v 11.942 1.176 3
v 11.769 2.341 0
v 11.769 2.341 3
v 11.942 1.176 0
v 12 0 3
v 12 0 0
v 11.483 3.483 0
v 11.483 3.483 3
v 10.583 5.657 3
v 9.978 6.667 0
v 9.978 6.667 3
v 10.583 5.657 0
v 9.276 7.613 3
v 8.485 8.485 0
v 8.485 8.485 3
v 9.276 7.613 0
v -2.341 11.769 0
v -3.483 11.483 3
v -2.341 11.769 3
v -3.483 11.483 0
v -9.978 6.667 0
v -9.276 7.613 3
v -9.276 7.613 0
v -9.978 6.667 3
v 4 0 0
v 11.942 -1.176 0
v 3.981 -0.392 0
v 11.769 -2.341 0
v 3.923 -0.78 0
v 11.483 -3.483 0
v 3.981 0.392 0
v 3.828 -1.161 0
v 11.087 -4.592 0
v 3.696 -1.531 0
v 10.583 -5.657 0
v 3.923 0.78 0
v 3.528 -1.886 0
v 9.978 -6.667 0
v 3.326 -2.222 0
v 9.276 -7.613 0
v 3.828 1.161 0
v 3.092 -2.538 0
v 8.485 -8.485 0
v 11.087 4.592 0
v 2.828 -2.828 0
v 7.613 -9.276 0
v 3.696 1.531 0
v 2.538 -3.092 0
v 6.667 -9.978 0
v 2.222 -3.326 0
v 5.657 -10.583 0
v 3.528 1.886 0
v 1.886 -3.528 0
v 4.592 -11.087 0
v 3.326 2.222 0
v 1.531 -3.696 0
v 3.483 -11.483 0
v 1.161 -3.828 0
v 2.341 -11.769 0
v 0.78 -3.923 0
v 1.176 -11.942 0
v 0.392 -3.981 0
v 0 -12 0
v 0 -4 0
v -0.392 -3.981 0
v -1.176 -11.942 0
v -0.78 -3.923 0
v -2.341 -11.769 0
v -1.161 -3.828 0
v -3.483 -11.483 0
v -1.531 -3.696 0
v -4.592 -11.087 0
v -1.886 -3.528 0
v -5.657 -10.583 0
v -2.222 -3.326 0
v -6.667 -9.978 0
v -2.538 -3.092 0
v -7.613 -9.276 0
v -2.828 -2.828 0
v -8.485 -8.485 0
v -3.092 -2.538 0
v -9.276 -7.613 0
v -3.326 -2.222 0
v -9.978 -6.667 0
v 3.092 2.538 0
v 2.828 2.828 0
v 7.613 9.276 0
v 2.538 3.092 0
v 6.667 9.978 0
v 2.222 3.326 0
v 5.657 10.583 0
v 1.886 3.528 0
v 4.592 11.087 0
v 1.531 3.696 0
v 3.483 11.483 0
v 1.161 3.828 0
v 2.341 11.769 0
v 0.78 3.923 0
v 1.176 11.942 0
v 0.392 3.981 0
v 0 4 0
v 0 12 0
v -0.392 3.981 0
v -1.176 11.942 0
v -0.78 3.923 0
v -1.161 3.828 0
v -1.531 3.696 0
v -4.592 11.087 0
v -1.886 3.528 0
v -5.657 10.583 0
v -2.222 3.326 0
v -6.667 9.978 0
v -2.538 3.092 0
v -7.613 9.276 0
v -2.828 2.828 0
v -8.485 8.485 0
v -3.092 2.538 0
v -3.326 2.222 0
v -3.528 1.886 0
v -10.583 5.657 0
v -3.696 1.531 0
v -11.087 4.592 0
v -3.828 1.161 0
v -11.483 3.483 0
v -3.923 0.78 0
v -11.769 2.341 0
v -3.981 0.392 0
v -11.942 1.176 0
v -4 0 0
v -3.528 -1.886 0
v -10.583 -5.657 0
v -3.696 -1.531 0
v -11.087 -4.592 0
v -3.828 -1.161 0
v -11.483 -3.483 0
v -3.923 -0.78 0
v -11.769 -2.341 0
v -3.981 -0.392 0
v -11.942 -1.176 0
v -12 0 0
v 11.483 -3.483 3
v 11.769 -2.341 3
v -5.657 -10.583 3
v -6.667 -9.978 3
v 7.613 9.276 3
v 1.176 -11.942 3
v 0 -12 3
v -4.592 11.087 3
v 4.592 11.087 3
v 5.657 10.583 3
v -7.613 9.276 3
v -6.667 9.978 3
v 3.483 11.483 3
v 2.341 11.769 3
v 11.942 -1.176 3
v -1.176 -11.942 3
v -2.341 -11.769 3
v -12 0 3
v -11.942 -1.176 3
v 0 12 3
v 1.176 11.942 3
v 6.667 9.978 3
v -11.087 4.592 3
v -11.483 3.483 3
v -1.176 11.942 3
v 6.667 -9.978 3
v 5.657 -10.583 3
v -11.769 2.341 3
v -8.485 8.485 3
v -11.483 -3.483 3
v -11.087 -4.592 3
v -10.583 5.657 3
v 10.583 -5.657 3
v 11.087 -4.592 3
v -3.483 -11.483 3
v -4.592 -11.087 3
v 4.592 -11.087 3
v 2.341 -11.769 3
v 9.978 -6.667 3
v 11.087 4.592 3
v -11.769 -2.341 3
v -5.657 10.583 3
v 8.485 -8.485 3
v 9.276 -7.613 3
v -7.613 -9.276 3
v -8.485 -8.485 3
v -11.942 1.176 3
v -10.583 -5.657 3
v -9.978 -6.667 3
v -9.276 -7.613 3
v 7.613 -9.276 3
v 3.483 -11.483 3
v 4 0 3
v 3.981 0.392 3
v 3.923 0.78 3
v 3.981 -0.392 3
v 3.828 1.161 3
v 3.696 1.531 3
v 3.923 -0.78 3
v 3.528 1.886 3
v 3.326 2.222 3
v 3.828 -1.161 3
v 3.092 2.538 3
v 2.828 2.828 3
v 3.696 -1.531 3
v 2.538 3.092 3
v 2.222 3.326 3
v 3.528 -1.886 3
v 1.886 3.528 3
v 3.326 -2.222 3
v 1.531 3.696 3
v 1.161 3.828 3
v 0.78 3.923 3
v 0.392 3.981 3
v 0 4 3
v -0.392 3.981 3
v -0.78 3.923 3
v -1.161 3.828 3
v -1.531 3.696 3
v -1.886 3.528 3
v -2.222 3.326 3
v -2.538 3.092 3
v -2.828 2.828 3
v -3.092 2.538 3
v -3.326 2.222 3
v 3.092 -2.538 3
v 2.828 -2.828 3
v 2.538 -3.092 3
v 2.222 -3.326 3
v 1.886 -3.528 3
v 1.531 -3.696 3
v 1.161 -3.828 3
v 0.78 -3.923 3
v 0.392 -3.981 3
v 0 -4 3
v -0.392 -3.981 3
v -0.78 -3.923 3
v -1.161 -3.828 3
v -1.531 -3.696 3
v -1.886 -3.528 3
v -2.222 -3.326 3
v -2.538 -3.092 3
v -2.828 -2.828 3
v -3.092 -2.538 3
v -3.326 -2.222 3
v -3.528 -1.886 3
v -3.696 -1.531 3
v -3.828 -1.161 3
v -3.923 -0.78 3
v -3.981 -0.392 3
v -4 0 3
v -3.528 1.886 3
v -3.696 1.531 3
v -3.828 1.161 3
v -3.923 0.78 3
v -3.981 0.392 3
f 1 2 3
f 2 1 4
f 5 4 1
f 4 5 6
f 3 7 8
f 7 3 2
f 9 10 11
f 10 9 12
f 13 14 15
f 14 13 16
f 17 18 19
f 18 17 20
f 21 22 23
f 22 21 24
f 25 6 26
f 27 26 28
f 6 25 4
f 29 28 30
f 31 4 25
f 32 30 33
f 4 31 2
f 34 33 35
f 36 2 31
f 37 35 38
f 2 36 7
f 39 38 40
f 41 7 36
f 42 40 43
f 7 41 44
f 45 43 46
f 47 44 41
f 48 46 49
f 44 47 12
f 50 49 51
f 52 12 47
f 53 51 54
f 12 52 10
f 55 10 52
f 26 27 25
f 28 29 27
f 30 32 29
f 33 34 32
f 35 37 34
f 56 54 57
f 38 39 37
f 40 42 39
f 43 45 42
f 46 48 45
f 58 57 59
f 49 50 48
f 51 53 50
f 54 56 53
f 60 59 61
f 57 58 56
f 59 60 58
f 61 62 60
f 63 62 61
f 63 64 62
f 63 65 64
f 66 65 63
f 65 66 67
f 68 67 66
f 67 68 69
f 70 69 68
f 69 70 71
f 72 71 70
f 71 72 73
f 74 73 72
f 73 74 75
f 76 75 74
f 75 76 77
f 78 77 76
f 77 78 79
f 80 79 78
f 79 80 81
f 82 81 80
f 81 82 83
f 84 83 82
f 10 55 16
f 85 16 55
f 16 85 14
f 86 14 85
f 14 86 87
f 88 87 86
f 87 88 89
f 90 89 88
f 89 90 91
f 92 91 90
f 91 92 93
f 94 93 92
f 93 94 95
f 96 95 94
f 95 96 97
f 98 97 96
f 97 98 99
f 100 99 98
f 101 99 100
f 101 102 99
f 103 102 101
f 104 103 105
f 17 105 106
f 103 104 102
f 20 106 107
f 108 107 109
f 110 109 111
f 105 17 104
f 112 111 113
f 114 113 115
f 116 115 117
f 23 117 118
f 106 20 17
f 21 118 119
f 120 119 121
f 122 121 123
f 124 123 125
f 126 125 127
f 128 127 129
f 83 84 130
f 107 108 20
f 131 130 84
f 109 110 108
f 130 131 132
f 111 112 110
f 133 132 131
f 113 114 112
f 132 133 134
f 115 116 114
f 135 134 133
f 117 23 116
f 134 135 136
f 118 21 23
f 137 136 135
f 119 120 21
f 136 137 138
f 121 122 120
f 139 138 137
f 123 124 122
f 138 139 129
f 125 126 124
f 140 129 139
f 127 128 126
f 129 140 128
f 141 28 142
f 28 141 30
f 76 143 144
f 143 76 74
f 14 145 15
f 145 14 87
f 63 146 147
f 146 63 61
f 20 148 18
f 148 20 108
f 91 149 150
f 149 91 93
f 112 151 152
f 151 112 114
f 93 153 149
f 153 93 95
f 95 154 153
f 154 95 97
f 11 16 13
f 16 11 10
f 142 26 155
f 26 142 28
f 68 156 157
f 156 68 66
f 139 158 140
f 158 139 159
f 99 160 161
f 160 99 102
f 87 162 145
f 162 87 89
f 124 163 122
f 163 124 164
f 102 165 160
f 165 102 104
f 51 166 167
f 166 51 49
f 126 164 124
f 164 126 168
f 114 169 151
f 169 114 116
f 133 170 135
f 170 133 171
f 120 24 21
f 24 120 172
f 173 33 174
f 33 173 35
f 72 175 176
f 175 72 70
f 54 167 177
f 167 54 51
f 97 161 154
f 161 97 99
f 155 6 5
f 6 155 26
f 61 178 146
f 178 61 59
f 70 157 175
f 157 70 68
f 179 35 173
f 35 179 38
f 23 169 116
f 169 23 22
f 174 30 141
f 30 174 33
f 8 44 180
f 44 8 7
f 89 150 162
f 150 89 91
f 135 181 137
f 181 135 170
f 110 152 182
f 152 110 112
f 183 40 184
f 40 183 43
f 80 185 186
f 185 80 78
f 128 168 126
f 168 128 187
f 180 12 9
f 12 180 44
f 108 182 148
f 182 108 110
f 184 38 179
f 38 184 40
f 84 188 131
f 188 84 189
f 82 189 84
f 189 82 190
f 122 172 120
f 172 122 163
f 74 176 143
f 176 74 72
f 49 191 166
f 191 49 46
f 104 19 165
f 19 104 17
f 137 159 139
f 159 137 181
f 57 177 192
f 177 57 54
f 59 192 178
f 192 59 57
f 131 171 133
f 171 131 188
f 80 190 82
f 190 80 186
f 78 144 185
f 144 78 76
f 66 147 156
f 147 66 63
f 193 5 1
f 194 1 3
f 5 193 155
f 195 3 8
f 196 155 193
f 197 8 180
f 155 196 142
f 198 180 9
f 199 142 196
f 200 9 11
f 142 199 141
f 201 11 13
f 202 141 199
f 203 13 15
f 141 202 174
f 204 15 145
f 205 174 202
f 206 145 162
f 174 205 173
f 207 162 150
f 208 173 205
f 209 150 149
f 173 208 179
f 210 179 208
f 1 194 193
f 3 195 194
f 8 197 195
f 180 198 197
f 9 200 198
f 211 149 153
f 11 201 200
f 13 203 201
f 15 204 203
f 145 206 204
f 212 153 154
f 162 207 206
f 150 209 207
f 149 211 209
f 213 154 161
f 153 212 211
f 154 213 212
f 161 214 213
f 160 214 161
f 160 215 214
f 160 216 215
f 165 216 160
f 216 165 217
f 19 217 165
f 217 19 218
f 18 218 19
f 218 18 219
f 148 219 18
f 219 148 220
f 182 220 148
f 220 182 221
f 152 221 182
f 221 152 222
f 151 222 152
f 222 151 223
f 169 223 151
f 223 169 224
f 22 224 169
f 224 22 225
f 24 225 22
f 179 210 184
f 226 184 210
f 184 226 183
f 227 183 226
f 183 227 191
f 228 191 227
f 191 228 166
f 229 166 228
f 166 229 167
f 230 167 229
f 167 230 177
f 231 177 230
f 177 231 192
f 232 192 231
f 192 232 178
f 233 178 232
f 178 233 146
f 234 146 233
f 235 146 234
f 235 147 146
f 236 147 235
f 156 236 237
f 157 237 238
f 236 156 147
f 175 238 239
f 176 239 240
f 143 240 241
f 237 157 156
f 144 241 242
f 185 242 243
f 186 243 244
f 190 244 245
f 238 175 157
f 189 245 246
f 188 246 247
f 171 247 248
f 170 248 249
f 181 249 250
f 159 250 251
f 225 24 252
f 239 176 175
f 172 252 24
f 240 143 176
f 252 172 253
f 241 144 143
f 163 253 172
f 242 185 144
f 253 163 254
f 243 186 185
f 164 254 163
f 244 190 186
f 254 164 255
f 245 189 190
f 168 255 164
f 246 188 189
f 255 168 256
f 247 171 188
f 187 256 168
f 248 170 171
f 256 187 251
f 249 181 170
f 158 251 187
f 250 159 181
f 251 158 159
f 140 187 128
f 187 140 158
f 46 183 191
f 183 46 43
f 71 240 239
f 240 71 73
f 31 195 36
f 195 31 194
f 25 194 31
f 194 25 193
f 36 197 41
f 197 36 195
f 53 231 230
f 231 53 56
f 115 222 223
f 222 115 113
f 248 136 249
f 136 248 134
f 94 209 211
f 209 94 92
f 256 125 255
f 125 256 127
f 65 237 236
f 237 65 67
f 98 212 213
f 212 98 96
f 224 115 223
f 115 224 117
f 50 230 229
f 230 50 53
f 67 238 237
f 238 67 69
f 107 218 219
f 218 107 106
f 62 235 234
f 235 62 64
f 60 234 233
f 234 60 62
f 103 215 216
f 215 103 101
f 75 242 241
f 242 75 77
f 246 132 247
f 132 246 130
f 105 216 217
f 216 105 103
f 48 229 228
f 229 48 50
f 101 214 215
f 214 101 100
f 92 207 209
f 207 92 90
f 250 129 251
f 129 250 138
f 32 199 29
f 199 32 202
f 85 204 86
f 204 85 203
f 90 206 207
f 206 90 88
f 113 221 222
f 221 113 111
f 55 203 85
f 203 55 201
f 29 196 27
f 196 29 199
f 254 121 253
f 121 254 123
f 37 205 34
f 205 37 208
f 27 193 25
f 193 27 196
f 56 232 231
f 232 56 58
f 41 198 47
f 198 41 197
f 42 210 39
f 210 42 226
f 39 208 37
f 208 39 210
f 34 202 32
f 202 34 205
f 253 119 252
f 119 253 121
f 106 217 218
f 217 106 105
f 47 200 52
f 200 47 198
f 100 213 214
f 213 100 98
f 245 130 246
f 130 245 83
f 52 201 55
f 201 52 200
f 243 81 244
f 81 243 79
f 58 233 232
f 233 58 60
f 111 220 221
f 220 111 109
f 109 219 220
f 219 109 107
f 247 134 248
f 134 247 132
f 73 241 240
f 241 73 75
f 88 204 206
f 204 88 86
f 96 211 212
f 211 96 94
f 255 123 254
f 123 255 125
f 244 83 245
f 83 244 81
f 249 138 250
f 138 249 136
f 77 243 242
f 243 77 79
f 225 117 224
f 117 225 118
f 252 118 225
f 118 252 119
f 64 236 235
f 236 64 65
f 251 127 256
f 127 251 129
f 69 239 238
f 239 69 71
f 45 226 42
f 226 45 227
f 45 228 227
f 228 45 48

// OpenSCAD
$fn = 64;
difference() {
  cylinder(h = 3, r = 12);
  translate([0, 0, -1]) cylinder(h = 5, r = 4);
}
